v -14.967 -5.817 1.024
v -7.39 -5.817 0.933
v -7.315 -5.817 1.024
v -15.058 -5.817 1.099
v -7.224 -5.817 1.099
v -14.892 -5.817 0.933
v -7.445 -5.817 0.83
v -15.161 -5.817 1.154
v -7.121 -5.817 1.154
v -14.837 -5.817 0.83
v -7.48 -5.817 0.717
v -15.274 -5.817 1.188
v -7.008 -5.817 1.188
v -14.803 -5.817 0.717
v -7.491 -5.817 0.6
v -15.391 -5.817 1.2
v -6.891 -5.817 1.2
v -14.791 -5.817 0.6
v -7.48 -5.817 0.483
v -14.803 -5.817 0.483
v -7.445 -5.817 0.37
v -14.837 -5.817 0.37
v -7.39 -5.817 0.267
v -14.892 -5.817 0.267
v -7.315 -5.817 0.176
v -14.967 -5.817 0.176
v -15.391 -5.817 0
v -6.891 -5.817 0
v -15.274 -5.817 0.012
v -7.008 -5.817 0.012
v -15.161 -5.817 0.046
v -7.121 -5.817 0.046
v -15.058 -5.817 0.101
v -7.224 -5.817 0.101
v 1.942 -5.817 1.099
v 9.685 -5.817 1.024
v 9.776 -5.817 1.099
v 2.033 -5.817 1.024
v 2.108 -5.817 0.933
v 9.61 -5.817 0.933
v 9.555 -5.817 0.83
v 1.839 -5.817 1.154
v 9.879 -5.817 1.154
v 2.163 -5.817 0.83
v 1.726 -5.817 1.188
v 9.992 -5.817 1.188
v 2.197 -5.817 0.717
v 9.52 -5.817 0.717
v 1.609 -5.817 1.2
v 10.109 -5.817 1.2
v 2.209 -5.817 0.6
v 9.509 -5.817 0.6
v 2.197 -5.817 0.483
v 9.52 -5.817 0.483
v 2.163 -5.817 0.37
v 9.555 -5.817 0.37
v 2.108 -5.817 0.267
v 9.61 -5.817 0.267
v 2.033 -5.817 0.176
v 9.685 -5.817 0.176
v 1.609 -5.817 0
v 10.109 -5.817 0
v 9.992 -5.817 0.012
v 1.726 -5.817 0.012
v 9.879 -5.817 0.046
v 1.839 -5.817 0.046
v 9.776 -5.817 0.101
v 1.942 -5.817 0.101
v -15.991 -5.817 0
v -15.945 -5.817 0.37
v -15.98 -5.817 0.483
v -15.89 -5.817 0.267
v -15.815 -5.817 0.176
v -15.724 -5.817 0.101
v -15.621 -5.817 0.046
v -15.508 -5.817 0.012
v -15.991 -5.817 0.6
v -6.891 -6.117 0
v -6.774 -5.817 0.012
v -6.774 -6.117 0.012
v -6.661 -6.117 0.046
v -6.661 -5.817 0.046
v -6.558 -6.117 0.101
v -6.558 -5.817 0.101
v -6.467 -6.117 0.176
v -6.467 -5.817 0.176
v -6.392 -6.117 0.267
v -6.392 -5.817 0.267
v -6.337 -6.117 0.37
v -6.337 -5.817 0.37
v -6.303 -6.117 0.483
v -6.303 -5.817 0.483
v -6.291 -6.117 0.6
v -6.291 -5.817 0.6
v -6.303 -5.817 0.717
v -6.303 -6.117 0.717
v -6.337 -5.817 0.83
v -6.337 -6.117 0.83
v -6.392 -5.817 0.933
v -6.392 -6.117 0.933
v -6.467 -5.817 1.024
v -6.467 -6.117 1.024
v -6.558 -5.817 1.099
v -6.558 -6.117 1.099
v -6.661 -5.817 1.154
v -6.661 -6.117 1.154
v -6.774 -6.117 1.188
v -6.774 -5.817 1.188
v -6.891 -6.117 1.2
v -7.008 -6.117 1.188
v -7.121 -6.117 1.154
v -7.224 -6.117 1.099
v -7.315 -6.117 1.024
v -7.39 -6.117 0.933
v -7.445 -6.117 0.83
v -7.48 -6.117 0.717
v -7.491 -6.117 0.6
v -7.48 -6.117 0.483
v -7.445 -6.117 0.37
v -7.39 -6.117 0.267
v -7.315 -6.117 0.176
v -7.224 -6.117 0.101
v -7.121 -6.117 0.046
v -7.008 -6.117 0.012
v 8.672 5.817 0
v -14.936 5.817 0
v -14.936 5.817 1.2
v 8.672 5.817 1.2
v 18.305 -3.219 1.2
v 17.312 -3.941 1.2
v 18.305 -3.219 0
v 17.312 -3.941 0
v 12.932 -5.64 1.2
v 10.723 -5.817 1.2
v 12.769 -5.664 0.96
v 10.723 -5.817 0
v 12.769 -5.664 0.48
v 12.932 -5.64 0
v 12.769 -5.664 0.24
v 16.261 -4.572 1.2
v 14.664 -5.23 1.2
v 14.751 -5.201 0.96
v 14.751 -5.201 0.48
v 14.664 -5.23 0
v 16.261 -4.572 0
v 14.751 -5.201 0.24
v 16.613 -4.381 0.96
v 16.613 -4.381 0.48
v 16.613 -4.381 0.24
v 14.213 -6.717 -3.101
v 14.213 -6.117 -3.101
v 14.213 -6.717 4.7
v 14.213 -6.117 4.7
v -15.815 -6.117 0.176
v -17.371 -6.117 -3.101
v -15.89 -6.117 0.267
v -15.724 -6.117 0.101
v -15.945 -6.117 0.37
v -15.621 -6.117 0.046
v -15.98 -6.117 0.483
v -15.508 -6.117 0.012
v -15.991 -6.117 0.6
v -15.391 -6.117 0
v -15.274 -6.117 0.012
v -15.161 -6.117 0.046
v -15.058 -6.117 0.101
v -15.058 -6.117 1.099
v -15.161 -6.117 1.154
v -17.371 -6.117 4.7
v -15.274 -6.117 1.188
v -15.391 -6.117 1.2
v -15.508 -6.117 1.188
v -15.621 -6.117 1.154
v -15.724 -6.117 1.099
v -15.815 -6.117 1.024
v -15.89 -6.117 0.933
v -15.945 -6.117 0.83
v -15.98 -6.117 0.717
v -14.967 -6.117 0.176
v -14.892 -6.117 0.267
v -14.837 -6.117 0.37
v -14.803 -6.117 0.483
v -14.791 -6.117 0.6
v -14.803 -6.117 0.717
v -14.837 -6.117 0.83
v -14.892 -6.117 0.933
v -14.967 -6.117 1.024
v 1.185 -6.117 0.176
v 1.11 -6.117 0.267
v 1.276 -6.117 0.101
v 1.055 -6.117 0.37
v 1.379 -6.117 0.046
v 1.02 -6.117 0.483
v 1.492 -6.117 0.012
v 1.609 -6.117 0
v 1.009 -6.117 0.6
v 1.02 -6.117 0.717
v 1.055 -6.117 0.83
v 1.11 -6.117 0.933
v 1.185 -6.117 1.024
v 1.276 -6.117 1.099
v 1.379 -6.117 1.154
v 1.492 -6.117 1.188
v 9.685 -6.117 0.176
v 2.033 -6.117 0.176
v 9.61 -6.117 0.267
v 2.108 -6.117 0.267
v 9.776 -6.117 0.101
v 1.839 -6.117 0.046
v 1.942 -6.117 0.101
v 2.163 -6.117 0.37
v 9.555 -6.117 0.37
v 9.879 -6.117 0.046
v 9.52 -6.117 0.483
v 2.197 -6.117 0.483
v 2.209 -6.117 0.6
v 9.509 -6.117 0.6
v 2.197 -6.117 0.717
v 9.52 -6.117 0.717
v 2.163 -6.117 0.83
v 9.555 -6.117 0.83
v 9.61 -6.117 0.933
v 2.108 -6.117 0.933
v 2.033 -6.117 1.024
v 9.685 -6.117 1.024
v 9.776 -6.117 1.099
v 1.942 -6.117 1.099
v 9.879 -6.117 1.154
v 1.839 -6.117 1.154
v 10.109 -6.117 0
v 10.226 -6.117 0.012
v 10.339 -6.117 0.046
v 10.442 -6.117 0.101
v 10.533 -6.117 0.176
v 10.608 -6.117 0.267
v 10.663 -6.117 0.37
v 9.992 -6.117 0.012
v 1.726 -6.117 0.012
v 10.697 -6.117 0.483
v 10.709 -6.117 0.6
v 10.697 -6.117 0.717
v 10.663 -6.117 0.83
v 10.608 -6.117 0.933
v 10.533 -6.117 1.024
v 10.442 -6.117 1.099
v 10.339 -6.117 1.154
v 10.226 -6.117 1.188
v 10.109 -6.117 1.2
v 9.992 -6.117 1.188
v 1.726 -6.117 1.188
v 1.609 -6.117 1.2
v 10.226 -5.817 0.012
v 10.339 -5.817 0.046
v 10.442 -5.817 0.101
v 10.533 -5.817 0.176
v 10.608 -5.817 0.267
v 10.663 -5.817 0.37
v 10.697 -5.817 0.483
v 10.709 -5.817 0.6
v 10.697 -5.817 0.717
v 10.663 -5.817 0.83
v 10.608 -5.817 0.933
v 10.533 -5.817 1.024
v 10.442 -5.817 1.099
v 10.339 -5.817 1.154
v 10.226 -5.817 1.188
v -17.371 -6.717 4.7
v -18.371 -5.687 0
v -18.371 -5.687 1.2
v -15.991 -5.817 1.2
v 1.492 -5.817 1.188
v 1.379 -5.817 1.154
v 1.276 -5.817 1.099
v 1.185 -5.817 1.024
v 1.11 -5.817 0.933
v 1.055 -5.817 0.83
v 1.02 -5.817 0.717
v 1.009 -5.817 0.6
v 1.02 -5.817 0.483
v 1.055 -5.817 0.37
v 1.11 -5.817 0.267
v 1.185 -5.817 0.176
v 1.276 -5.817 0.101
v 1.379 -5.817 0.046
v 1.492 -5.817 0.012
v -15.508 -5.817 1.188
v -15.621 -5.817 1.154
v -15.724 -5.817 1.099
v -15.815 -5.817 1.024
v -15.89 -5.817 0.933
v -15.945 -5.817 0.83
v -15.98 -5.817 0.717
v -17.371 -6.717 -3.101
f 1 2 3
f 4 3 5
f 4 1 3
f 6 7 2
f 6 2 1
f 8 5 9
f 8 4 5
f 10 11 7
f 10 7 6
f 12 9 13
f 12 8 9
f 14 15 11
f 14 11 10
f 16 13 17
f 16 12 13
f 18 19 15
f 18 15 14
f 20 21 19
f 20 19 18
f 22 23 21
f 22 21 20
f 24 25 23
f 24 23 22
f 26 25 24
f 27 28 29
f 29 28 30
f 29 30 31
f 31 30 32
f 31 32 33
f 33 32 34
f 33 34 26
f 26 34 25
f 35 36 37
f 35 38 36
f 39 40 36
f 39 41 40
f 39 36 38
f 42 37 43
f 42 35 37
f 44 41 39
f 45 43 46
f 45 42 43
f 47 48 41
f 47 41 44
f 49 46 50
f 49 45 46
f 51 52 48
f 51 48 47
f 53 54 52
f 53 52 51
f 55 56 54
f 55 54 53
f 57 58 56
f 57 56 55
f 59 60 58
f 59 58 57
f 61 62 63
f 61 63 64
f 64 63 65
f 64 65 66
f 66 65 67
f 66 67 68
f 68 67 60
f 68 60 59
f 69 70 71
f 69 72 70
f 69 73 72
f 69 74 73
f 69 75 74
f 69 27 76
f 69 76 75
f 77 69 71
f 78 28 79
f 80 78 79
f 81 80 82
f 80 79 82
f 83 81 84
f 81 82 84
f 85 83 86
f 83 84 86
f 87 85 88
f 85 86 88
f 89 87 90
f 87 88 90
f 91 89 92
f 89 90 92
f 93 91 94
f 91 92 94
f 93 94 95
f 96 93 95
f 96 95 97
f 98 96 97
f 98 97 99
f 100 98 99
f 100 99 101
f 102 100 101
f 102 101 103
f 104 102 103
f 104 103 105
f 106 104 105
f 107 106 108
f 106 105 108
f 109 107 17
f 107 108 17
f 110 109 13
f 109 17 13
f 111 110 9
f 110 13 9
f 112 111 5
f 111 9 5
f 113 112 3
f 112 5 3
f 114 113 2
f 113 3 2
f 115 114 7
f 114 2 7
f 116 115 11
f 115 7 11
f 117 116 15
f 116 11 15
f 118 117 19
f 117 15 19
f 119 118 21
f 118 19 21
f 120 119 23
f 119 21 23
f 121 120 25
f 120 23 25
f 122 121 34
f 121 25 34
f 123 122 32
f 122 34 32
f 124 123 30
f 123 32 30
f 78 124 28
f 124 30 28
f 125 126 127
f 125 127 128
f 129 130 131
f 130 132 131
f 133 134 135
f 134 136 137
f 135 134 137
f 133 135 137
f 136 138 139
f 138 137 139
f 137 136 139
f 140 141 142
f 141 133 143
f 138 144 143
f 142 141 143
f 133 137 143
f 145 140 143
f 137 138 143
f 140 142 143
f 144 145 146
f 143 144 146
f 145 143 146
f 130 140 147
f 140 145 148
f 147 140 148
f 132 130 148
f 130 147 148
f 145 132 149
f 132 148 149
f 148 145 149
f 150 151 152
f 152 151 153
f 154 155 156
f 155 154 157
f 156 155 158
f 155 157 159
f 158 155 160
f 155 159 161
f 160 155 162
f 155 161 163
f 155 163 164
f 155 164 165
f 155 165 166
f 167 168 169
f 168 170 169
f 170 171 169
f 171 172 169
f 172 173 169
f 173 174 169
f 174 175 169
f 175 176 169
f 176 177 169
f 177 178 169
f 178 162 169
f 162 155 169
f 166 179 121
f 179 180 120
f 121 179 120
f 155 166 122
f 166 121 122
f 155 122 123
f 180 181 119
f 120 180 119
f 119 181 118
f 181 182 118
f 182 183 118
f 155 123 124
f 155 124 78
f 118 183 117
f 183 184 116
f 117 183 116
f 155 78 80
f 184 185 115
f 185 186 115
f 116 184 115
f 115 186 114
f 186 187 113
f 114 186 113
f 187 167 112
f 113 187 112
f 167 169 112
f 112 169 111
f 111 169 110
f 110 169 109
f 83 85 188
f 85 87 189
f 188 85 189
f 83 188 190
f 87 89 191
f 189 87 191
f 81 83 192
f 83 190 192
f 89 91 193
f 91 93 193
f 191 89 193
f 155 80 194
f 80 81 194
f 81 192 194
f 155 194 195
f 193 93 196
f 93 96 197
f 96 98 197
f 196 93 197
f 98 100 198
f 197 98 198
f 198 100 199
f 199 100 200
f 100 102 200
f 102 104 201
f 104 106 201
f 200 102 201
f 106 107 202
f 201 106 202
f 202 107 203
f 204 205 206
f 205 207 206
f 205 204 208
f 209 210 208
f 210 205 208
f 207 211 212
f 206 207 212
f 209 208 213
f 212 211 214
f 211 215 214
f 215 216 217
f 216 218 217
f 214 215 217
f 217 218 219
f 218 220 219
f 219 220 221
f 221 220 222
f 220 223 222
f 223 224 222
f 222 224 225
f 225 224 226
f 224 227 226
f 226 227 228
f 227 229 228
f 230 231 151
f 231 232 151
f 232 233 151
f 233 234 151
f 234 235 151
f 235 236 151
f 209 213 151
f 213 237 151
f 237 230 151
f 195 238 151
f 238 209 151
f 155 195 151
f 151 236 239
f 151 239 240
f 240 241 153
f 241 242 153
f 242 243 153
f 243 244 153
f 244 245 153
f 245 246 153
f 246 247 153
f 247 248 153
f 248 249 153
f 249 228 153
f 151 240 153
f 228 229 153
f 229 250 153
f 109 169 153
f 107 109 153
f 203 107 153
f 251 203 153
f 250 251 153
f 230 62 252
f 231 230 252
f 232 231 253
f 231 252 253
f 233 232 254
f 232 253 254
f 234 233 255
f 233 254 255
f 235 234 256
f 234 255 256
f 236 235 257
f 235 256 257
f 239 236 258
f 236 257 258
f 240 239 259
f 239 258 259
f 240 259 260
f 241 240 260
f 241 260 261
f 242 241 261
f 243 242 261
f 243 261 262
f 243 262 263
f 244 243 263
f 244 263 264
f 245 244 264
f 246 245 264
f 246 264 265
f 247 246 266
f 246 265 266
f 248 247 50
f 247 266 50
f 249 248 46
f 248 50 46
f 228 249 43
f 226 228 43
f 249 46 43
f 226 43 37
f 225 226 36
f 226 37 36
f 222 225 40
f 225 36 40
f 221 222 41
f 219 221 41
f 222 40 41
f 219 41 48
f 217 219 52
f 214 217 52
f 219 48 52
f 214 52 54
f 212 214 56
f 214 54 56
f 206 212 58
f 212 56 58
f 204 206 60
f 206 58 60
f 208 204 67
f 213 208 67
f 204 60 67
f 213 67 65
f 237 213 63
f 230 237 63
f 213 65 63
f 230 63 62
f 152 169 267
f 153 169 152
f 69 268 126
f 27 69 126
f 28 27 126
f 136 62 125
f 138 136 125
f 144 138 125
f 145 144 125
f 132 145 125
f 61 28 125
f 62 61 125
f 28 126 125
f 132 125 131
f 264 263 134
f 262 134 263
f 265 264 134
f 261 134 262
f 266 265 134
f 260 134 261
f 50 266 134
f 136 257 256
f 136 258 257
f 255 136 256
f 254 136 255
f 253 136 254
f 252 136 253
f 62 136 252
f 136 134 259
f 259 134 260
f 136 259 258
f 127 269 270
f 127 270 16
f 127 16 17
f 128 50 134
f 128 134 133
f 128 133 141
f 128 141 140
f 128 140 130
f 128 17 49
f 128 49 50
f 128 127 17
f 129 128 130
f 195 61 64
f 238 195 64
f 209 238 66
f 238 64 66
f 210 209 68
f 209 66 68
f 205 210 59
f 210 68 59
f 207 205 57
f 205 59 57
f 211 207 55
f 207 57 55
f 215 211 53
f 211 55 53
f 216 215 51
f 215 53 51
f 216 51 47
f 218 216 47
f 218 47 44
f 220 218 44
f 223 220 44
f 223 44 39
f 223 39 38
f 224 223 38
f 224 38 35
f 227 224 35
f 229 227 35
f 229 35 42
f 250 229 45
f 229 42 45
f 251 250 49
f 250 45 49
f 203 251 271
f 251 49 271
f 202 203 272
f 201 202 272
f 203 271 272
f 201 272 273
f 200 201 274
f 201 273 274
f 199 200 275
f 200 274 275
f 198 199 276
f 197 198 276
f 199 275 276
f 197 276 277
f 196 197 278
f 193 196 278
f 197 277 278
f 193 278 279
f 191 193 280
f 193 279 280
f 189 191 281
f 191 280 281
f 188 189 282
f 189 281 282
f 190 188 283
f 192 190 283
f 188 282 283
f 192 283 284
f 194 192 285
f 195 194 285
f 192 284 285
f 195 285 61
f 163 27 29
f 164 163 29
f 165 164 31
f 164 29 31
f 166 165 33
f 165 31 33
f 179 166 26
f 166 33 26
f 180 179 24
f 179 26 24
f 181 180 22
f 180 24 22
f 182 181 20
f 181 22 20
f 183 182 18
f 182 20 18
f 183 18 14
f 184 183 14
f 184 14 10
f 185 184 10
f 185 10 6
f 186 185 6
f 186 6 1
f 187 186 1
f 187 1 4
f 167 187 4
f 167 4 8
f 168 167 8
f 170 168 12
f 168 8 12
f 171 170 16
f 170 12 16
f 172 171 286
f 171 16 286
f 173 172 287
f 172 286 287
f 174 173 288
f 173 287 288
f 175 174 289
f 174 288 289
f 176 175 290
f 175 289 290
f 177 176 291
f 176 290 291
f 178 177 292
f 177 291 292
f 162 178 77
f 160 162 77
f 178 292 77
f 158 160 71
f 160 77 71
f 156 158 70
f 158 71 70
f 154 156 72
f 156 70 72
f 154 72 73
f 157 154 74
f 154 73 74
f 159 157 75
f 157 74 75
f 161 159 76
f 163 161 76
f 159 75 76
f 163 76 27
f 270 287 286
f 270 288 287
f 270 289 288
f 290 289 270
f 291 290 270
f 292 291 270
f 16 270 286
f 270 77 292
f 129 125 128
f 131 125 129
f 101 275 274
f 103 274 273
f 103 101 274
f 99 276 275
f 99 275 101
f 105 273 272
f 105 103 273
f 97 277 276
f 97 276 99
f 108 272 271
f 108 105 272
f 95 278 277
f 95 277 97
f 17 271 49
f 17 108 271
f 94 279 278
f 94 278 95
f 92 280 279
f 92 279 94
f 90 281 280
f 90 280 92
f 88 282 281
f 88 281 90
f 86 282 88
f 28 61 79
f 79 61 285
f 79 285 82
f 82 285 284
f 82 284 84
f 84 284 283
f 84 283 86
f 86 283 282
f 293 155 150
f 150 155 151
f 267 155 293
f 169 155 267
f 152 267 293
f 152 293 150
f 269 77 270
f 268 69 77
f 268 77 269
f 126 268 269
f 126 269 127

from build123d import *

# Parameters (mm, degrees)
EXTRUDE_1_DEPTH     = 1.2
CUT_EXTRUDE_START   = -1.2
CUT_EXTRUDE_1_DEPTH = 1.2
SKETCH_3_R          = 0.6
EXTRUDE_2_DEPTH     = 0.3
SKETCH_4_W          = 31.58406245
SKETCH_4_H          = 7.800680058
EXTRUDE_3_DEPTH     = 0.6


# Read off the part's stored shape, not the designer's step: Вырез-Вытянуть-Тонкостенный1
with BuildPart() as part:
    # Эскиз1 → Бобышка-Вытянуть1 (new body)
    with BuildSketch(Plane.XY):
        with BuildLine():
            Line((-18.4888994, -6.081212357), (-16.002013835, -6.217213911))
            Line((-16.002013835, -6.217213911), (10.732005982, -6.217213911))
            add(Edge.make_bspline(
                [(10.732005982, -6.217213911), (11.47341135, -6.18385268), (12.922426791, -6.118650915), (15.00936311, -5.600631561), (16.935457079, -4.747576966), (18.044624718, -3.914711141), (18.600667338, -3.497182825)],
                knots=[0, 0, 0, 0, 0.261630689, 0.511335532, 0.755025064, 1, 1, 1, 1], degree=3))
            Line((18.600667338, -3.497182825), (18.870975113, -3.202301616))
            Line((18.870975113, -3.202301616), (8.829771562, 6.217213911))
            Line((8.829771562, 6.217213911), (-15.234306629, 6.217213911))
            Line((-15.234306629, 6.217213911), (-18.870975113, -5.962739267))
            Line((-18.870975113, -5.962739267), (-18.4888994, -6.081212357))
        make_face()
    extrude(amount=EXTRUDE_1_DEPTH)

    # Вырез-Вытянуть-Тонкостенный1 outline → Вырез-Вытянуть-Тонкостенный1 (cut)
    with BuildSketch(Plane.XY.offset(1.2).offset(CUT_EXTRUDE_START)):
        with BuildLine():
            Line((-16.002013835, -6.217213911), (10.732005982, -6.217213911))
            add(Edge.make_bspline(
                [(10.732005982, -6.217213911), (11.47341135, -6.18385268), (12.922426791, -6.118650915), (15.00936311, -5.600631561), (16.935457079, -4.747576966), (18.044624718, -3.914711141), (18.600667338, -3.497182825)],
                knots=[0, 0, 0, 0, 0.261630689, 0.511335532, 0.755025064, 1, 1, 1, 1], degree=3))
            Line((18.600667338, -3.497182825), (18.870975113, -3.202301616))
            Line((18.870975113, -3.202301616), (8.829771562, 6.217213911))
            Line((8.829771562, 6.217213911), (-15.234306629, 6.217213911))
            Line((-15.234306629, 6.217213911), (-18.870975113, -5.962739267))
            Line((-18.870975113, -5.962739267), (-18.4888994, -6.081212357))
            Line((-18.4888994, -6.081212357), (-16.002013835, -6.217213911))
        make_face()
        with BuildLine():
            add(Edge.make_bspline(
                [(10.723010965, -5.817213911), (11.406644912, -5.786451106), (12.090314496, -5.756131603), (13.447652329, -5.571081257), (14.109804636, -5.413655126), (15.071741231, -5.094978106), (15.387815329, -4.97510238), (16.009307585, -4.703532881), (16.315751157, -4.551234574), (17.2086095, -4.040085881), (17.756993168, -3.630363934), (18.304501391, -3.219353606)],
                knots=[0, 0, 0, 0, 0.25, 0.25, 0.5, 0.5, 0.625, 0.625, 0.75, 0.75, 1, 1, 1, 1], degree=3))
            Line((10.723010965, -5.817213911), (-15.991084501, -5.817213911))
            Line((-15.991084501, -5.817213911), (-18.37121133, -5.687050725))
            Line((-18.37121133, -5.687050725), (-14.936288713, 5.817213911))
            Line((-14.936288713, 5.817213911), (8.671520418, 5.817213911))
            Line((8.671520418, 5.817213911), (18.304501391, -3.219353606))
        make_face(mode=Mode.SUBTRACT)
    extrude(amount=CUT_EXTRUDE_1_DEPTH, mode=Mode.SUBTRACT)

    # Эскиз3 → Бобышка-Вытянуть2 (add)
    with BuildSketch(Plane.XZ.offset(5.817213911)):
        with Locations(Location((-15.391084501, 0.6, 0), (0, 0, 270))):
            Circle(SKETCH_3_R)
        with Locations(Location((-6.891084501, 0.6, 0), (0, 0, 270))):
            Circle(SKETCH_3_R)
        with Locations(Location((1.608915499, 0.6, 0), (0, 0, 270))):
            Circle(SKETCH_3_R)
        with Locations(Location((10.108915499, 0.6, 0), (0, 0, 270))):
            Circle(SKETCH_3_R)
    extrude(amount=EXTRUDE_2_DEPTH)

    # Эскиз4 → Бобышка-Вытянуть3 (add)
    with BuildSketch(Plane.XZ.offset(6.117213911)):
        with Locations((-1.579371694, 0.79934669)):
            Rectangle(SKETCH_4_W, SKETCH_4_H)
    extrude(amount=EXTRUDE_3_DEPTH)


solid = part.part
